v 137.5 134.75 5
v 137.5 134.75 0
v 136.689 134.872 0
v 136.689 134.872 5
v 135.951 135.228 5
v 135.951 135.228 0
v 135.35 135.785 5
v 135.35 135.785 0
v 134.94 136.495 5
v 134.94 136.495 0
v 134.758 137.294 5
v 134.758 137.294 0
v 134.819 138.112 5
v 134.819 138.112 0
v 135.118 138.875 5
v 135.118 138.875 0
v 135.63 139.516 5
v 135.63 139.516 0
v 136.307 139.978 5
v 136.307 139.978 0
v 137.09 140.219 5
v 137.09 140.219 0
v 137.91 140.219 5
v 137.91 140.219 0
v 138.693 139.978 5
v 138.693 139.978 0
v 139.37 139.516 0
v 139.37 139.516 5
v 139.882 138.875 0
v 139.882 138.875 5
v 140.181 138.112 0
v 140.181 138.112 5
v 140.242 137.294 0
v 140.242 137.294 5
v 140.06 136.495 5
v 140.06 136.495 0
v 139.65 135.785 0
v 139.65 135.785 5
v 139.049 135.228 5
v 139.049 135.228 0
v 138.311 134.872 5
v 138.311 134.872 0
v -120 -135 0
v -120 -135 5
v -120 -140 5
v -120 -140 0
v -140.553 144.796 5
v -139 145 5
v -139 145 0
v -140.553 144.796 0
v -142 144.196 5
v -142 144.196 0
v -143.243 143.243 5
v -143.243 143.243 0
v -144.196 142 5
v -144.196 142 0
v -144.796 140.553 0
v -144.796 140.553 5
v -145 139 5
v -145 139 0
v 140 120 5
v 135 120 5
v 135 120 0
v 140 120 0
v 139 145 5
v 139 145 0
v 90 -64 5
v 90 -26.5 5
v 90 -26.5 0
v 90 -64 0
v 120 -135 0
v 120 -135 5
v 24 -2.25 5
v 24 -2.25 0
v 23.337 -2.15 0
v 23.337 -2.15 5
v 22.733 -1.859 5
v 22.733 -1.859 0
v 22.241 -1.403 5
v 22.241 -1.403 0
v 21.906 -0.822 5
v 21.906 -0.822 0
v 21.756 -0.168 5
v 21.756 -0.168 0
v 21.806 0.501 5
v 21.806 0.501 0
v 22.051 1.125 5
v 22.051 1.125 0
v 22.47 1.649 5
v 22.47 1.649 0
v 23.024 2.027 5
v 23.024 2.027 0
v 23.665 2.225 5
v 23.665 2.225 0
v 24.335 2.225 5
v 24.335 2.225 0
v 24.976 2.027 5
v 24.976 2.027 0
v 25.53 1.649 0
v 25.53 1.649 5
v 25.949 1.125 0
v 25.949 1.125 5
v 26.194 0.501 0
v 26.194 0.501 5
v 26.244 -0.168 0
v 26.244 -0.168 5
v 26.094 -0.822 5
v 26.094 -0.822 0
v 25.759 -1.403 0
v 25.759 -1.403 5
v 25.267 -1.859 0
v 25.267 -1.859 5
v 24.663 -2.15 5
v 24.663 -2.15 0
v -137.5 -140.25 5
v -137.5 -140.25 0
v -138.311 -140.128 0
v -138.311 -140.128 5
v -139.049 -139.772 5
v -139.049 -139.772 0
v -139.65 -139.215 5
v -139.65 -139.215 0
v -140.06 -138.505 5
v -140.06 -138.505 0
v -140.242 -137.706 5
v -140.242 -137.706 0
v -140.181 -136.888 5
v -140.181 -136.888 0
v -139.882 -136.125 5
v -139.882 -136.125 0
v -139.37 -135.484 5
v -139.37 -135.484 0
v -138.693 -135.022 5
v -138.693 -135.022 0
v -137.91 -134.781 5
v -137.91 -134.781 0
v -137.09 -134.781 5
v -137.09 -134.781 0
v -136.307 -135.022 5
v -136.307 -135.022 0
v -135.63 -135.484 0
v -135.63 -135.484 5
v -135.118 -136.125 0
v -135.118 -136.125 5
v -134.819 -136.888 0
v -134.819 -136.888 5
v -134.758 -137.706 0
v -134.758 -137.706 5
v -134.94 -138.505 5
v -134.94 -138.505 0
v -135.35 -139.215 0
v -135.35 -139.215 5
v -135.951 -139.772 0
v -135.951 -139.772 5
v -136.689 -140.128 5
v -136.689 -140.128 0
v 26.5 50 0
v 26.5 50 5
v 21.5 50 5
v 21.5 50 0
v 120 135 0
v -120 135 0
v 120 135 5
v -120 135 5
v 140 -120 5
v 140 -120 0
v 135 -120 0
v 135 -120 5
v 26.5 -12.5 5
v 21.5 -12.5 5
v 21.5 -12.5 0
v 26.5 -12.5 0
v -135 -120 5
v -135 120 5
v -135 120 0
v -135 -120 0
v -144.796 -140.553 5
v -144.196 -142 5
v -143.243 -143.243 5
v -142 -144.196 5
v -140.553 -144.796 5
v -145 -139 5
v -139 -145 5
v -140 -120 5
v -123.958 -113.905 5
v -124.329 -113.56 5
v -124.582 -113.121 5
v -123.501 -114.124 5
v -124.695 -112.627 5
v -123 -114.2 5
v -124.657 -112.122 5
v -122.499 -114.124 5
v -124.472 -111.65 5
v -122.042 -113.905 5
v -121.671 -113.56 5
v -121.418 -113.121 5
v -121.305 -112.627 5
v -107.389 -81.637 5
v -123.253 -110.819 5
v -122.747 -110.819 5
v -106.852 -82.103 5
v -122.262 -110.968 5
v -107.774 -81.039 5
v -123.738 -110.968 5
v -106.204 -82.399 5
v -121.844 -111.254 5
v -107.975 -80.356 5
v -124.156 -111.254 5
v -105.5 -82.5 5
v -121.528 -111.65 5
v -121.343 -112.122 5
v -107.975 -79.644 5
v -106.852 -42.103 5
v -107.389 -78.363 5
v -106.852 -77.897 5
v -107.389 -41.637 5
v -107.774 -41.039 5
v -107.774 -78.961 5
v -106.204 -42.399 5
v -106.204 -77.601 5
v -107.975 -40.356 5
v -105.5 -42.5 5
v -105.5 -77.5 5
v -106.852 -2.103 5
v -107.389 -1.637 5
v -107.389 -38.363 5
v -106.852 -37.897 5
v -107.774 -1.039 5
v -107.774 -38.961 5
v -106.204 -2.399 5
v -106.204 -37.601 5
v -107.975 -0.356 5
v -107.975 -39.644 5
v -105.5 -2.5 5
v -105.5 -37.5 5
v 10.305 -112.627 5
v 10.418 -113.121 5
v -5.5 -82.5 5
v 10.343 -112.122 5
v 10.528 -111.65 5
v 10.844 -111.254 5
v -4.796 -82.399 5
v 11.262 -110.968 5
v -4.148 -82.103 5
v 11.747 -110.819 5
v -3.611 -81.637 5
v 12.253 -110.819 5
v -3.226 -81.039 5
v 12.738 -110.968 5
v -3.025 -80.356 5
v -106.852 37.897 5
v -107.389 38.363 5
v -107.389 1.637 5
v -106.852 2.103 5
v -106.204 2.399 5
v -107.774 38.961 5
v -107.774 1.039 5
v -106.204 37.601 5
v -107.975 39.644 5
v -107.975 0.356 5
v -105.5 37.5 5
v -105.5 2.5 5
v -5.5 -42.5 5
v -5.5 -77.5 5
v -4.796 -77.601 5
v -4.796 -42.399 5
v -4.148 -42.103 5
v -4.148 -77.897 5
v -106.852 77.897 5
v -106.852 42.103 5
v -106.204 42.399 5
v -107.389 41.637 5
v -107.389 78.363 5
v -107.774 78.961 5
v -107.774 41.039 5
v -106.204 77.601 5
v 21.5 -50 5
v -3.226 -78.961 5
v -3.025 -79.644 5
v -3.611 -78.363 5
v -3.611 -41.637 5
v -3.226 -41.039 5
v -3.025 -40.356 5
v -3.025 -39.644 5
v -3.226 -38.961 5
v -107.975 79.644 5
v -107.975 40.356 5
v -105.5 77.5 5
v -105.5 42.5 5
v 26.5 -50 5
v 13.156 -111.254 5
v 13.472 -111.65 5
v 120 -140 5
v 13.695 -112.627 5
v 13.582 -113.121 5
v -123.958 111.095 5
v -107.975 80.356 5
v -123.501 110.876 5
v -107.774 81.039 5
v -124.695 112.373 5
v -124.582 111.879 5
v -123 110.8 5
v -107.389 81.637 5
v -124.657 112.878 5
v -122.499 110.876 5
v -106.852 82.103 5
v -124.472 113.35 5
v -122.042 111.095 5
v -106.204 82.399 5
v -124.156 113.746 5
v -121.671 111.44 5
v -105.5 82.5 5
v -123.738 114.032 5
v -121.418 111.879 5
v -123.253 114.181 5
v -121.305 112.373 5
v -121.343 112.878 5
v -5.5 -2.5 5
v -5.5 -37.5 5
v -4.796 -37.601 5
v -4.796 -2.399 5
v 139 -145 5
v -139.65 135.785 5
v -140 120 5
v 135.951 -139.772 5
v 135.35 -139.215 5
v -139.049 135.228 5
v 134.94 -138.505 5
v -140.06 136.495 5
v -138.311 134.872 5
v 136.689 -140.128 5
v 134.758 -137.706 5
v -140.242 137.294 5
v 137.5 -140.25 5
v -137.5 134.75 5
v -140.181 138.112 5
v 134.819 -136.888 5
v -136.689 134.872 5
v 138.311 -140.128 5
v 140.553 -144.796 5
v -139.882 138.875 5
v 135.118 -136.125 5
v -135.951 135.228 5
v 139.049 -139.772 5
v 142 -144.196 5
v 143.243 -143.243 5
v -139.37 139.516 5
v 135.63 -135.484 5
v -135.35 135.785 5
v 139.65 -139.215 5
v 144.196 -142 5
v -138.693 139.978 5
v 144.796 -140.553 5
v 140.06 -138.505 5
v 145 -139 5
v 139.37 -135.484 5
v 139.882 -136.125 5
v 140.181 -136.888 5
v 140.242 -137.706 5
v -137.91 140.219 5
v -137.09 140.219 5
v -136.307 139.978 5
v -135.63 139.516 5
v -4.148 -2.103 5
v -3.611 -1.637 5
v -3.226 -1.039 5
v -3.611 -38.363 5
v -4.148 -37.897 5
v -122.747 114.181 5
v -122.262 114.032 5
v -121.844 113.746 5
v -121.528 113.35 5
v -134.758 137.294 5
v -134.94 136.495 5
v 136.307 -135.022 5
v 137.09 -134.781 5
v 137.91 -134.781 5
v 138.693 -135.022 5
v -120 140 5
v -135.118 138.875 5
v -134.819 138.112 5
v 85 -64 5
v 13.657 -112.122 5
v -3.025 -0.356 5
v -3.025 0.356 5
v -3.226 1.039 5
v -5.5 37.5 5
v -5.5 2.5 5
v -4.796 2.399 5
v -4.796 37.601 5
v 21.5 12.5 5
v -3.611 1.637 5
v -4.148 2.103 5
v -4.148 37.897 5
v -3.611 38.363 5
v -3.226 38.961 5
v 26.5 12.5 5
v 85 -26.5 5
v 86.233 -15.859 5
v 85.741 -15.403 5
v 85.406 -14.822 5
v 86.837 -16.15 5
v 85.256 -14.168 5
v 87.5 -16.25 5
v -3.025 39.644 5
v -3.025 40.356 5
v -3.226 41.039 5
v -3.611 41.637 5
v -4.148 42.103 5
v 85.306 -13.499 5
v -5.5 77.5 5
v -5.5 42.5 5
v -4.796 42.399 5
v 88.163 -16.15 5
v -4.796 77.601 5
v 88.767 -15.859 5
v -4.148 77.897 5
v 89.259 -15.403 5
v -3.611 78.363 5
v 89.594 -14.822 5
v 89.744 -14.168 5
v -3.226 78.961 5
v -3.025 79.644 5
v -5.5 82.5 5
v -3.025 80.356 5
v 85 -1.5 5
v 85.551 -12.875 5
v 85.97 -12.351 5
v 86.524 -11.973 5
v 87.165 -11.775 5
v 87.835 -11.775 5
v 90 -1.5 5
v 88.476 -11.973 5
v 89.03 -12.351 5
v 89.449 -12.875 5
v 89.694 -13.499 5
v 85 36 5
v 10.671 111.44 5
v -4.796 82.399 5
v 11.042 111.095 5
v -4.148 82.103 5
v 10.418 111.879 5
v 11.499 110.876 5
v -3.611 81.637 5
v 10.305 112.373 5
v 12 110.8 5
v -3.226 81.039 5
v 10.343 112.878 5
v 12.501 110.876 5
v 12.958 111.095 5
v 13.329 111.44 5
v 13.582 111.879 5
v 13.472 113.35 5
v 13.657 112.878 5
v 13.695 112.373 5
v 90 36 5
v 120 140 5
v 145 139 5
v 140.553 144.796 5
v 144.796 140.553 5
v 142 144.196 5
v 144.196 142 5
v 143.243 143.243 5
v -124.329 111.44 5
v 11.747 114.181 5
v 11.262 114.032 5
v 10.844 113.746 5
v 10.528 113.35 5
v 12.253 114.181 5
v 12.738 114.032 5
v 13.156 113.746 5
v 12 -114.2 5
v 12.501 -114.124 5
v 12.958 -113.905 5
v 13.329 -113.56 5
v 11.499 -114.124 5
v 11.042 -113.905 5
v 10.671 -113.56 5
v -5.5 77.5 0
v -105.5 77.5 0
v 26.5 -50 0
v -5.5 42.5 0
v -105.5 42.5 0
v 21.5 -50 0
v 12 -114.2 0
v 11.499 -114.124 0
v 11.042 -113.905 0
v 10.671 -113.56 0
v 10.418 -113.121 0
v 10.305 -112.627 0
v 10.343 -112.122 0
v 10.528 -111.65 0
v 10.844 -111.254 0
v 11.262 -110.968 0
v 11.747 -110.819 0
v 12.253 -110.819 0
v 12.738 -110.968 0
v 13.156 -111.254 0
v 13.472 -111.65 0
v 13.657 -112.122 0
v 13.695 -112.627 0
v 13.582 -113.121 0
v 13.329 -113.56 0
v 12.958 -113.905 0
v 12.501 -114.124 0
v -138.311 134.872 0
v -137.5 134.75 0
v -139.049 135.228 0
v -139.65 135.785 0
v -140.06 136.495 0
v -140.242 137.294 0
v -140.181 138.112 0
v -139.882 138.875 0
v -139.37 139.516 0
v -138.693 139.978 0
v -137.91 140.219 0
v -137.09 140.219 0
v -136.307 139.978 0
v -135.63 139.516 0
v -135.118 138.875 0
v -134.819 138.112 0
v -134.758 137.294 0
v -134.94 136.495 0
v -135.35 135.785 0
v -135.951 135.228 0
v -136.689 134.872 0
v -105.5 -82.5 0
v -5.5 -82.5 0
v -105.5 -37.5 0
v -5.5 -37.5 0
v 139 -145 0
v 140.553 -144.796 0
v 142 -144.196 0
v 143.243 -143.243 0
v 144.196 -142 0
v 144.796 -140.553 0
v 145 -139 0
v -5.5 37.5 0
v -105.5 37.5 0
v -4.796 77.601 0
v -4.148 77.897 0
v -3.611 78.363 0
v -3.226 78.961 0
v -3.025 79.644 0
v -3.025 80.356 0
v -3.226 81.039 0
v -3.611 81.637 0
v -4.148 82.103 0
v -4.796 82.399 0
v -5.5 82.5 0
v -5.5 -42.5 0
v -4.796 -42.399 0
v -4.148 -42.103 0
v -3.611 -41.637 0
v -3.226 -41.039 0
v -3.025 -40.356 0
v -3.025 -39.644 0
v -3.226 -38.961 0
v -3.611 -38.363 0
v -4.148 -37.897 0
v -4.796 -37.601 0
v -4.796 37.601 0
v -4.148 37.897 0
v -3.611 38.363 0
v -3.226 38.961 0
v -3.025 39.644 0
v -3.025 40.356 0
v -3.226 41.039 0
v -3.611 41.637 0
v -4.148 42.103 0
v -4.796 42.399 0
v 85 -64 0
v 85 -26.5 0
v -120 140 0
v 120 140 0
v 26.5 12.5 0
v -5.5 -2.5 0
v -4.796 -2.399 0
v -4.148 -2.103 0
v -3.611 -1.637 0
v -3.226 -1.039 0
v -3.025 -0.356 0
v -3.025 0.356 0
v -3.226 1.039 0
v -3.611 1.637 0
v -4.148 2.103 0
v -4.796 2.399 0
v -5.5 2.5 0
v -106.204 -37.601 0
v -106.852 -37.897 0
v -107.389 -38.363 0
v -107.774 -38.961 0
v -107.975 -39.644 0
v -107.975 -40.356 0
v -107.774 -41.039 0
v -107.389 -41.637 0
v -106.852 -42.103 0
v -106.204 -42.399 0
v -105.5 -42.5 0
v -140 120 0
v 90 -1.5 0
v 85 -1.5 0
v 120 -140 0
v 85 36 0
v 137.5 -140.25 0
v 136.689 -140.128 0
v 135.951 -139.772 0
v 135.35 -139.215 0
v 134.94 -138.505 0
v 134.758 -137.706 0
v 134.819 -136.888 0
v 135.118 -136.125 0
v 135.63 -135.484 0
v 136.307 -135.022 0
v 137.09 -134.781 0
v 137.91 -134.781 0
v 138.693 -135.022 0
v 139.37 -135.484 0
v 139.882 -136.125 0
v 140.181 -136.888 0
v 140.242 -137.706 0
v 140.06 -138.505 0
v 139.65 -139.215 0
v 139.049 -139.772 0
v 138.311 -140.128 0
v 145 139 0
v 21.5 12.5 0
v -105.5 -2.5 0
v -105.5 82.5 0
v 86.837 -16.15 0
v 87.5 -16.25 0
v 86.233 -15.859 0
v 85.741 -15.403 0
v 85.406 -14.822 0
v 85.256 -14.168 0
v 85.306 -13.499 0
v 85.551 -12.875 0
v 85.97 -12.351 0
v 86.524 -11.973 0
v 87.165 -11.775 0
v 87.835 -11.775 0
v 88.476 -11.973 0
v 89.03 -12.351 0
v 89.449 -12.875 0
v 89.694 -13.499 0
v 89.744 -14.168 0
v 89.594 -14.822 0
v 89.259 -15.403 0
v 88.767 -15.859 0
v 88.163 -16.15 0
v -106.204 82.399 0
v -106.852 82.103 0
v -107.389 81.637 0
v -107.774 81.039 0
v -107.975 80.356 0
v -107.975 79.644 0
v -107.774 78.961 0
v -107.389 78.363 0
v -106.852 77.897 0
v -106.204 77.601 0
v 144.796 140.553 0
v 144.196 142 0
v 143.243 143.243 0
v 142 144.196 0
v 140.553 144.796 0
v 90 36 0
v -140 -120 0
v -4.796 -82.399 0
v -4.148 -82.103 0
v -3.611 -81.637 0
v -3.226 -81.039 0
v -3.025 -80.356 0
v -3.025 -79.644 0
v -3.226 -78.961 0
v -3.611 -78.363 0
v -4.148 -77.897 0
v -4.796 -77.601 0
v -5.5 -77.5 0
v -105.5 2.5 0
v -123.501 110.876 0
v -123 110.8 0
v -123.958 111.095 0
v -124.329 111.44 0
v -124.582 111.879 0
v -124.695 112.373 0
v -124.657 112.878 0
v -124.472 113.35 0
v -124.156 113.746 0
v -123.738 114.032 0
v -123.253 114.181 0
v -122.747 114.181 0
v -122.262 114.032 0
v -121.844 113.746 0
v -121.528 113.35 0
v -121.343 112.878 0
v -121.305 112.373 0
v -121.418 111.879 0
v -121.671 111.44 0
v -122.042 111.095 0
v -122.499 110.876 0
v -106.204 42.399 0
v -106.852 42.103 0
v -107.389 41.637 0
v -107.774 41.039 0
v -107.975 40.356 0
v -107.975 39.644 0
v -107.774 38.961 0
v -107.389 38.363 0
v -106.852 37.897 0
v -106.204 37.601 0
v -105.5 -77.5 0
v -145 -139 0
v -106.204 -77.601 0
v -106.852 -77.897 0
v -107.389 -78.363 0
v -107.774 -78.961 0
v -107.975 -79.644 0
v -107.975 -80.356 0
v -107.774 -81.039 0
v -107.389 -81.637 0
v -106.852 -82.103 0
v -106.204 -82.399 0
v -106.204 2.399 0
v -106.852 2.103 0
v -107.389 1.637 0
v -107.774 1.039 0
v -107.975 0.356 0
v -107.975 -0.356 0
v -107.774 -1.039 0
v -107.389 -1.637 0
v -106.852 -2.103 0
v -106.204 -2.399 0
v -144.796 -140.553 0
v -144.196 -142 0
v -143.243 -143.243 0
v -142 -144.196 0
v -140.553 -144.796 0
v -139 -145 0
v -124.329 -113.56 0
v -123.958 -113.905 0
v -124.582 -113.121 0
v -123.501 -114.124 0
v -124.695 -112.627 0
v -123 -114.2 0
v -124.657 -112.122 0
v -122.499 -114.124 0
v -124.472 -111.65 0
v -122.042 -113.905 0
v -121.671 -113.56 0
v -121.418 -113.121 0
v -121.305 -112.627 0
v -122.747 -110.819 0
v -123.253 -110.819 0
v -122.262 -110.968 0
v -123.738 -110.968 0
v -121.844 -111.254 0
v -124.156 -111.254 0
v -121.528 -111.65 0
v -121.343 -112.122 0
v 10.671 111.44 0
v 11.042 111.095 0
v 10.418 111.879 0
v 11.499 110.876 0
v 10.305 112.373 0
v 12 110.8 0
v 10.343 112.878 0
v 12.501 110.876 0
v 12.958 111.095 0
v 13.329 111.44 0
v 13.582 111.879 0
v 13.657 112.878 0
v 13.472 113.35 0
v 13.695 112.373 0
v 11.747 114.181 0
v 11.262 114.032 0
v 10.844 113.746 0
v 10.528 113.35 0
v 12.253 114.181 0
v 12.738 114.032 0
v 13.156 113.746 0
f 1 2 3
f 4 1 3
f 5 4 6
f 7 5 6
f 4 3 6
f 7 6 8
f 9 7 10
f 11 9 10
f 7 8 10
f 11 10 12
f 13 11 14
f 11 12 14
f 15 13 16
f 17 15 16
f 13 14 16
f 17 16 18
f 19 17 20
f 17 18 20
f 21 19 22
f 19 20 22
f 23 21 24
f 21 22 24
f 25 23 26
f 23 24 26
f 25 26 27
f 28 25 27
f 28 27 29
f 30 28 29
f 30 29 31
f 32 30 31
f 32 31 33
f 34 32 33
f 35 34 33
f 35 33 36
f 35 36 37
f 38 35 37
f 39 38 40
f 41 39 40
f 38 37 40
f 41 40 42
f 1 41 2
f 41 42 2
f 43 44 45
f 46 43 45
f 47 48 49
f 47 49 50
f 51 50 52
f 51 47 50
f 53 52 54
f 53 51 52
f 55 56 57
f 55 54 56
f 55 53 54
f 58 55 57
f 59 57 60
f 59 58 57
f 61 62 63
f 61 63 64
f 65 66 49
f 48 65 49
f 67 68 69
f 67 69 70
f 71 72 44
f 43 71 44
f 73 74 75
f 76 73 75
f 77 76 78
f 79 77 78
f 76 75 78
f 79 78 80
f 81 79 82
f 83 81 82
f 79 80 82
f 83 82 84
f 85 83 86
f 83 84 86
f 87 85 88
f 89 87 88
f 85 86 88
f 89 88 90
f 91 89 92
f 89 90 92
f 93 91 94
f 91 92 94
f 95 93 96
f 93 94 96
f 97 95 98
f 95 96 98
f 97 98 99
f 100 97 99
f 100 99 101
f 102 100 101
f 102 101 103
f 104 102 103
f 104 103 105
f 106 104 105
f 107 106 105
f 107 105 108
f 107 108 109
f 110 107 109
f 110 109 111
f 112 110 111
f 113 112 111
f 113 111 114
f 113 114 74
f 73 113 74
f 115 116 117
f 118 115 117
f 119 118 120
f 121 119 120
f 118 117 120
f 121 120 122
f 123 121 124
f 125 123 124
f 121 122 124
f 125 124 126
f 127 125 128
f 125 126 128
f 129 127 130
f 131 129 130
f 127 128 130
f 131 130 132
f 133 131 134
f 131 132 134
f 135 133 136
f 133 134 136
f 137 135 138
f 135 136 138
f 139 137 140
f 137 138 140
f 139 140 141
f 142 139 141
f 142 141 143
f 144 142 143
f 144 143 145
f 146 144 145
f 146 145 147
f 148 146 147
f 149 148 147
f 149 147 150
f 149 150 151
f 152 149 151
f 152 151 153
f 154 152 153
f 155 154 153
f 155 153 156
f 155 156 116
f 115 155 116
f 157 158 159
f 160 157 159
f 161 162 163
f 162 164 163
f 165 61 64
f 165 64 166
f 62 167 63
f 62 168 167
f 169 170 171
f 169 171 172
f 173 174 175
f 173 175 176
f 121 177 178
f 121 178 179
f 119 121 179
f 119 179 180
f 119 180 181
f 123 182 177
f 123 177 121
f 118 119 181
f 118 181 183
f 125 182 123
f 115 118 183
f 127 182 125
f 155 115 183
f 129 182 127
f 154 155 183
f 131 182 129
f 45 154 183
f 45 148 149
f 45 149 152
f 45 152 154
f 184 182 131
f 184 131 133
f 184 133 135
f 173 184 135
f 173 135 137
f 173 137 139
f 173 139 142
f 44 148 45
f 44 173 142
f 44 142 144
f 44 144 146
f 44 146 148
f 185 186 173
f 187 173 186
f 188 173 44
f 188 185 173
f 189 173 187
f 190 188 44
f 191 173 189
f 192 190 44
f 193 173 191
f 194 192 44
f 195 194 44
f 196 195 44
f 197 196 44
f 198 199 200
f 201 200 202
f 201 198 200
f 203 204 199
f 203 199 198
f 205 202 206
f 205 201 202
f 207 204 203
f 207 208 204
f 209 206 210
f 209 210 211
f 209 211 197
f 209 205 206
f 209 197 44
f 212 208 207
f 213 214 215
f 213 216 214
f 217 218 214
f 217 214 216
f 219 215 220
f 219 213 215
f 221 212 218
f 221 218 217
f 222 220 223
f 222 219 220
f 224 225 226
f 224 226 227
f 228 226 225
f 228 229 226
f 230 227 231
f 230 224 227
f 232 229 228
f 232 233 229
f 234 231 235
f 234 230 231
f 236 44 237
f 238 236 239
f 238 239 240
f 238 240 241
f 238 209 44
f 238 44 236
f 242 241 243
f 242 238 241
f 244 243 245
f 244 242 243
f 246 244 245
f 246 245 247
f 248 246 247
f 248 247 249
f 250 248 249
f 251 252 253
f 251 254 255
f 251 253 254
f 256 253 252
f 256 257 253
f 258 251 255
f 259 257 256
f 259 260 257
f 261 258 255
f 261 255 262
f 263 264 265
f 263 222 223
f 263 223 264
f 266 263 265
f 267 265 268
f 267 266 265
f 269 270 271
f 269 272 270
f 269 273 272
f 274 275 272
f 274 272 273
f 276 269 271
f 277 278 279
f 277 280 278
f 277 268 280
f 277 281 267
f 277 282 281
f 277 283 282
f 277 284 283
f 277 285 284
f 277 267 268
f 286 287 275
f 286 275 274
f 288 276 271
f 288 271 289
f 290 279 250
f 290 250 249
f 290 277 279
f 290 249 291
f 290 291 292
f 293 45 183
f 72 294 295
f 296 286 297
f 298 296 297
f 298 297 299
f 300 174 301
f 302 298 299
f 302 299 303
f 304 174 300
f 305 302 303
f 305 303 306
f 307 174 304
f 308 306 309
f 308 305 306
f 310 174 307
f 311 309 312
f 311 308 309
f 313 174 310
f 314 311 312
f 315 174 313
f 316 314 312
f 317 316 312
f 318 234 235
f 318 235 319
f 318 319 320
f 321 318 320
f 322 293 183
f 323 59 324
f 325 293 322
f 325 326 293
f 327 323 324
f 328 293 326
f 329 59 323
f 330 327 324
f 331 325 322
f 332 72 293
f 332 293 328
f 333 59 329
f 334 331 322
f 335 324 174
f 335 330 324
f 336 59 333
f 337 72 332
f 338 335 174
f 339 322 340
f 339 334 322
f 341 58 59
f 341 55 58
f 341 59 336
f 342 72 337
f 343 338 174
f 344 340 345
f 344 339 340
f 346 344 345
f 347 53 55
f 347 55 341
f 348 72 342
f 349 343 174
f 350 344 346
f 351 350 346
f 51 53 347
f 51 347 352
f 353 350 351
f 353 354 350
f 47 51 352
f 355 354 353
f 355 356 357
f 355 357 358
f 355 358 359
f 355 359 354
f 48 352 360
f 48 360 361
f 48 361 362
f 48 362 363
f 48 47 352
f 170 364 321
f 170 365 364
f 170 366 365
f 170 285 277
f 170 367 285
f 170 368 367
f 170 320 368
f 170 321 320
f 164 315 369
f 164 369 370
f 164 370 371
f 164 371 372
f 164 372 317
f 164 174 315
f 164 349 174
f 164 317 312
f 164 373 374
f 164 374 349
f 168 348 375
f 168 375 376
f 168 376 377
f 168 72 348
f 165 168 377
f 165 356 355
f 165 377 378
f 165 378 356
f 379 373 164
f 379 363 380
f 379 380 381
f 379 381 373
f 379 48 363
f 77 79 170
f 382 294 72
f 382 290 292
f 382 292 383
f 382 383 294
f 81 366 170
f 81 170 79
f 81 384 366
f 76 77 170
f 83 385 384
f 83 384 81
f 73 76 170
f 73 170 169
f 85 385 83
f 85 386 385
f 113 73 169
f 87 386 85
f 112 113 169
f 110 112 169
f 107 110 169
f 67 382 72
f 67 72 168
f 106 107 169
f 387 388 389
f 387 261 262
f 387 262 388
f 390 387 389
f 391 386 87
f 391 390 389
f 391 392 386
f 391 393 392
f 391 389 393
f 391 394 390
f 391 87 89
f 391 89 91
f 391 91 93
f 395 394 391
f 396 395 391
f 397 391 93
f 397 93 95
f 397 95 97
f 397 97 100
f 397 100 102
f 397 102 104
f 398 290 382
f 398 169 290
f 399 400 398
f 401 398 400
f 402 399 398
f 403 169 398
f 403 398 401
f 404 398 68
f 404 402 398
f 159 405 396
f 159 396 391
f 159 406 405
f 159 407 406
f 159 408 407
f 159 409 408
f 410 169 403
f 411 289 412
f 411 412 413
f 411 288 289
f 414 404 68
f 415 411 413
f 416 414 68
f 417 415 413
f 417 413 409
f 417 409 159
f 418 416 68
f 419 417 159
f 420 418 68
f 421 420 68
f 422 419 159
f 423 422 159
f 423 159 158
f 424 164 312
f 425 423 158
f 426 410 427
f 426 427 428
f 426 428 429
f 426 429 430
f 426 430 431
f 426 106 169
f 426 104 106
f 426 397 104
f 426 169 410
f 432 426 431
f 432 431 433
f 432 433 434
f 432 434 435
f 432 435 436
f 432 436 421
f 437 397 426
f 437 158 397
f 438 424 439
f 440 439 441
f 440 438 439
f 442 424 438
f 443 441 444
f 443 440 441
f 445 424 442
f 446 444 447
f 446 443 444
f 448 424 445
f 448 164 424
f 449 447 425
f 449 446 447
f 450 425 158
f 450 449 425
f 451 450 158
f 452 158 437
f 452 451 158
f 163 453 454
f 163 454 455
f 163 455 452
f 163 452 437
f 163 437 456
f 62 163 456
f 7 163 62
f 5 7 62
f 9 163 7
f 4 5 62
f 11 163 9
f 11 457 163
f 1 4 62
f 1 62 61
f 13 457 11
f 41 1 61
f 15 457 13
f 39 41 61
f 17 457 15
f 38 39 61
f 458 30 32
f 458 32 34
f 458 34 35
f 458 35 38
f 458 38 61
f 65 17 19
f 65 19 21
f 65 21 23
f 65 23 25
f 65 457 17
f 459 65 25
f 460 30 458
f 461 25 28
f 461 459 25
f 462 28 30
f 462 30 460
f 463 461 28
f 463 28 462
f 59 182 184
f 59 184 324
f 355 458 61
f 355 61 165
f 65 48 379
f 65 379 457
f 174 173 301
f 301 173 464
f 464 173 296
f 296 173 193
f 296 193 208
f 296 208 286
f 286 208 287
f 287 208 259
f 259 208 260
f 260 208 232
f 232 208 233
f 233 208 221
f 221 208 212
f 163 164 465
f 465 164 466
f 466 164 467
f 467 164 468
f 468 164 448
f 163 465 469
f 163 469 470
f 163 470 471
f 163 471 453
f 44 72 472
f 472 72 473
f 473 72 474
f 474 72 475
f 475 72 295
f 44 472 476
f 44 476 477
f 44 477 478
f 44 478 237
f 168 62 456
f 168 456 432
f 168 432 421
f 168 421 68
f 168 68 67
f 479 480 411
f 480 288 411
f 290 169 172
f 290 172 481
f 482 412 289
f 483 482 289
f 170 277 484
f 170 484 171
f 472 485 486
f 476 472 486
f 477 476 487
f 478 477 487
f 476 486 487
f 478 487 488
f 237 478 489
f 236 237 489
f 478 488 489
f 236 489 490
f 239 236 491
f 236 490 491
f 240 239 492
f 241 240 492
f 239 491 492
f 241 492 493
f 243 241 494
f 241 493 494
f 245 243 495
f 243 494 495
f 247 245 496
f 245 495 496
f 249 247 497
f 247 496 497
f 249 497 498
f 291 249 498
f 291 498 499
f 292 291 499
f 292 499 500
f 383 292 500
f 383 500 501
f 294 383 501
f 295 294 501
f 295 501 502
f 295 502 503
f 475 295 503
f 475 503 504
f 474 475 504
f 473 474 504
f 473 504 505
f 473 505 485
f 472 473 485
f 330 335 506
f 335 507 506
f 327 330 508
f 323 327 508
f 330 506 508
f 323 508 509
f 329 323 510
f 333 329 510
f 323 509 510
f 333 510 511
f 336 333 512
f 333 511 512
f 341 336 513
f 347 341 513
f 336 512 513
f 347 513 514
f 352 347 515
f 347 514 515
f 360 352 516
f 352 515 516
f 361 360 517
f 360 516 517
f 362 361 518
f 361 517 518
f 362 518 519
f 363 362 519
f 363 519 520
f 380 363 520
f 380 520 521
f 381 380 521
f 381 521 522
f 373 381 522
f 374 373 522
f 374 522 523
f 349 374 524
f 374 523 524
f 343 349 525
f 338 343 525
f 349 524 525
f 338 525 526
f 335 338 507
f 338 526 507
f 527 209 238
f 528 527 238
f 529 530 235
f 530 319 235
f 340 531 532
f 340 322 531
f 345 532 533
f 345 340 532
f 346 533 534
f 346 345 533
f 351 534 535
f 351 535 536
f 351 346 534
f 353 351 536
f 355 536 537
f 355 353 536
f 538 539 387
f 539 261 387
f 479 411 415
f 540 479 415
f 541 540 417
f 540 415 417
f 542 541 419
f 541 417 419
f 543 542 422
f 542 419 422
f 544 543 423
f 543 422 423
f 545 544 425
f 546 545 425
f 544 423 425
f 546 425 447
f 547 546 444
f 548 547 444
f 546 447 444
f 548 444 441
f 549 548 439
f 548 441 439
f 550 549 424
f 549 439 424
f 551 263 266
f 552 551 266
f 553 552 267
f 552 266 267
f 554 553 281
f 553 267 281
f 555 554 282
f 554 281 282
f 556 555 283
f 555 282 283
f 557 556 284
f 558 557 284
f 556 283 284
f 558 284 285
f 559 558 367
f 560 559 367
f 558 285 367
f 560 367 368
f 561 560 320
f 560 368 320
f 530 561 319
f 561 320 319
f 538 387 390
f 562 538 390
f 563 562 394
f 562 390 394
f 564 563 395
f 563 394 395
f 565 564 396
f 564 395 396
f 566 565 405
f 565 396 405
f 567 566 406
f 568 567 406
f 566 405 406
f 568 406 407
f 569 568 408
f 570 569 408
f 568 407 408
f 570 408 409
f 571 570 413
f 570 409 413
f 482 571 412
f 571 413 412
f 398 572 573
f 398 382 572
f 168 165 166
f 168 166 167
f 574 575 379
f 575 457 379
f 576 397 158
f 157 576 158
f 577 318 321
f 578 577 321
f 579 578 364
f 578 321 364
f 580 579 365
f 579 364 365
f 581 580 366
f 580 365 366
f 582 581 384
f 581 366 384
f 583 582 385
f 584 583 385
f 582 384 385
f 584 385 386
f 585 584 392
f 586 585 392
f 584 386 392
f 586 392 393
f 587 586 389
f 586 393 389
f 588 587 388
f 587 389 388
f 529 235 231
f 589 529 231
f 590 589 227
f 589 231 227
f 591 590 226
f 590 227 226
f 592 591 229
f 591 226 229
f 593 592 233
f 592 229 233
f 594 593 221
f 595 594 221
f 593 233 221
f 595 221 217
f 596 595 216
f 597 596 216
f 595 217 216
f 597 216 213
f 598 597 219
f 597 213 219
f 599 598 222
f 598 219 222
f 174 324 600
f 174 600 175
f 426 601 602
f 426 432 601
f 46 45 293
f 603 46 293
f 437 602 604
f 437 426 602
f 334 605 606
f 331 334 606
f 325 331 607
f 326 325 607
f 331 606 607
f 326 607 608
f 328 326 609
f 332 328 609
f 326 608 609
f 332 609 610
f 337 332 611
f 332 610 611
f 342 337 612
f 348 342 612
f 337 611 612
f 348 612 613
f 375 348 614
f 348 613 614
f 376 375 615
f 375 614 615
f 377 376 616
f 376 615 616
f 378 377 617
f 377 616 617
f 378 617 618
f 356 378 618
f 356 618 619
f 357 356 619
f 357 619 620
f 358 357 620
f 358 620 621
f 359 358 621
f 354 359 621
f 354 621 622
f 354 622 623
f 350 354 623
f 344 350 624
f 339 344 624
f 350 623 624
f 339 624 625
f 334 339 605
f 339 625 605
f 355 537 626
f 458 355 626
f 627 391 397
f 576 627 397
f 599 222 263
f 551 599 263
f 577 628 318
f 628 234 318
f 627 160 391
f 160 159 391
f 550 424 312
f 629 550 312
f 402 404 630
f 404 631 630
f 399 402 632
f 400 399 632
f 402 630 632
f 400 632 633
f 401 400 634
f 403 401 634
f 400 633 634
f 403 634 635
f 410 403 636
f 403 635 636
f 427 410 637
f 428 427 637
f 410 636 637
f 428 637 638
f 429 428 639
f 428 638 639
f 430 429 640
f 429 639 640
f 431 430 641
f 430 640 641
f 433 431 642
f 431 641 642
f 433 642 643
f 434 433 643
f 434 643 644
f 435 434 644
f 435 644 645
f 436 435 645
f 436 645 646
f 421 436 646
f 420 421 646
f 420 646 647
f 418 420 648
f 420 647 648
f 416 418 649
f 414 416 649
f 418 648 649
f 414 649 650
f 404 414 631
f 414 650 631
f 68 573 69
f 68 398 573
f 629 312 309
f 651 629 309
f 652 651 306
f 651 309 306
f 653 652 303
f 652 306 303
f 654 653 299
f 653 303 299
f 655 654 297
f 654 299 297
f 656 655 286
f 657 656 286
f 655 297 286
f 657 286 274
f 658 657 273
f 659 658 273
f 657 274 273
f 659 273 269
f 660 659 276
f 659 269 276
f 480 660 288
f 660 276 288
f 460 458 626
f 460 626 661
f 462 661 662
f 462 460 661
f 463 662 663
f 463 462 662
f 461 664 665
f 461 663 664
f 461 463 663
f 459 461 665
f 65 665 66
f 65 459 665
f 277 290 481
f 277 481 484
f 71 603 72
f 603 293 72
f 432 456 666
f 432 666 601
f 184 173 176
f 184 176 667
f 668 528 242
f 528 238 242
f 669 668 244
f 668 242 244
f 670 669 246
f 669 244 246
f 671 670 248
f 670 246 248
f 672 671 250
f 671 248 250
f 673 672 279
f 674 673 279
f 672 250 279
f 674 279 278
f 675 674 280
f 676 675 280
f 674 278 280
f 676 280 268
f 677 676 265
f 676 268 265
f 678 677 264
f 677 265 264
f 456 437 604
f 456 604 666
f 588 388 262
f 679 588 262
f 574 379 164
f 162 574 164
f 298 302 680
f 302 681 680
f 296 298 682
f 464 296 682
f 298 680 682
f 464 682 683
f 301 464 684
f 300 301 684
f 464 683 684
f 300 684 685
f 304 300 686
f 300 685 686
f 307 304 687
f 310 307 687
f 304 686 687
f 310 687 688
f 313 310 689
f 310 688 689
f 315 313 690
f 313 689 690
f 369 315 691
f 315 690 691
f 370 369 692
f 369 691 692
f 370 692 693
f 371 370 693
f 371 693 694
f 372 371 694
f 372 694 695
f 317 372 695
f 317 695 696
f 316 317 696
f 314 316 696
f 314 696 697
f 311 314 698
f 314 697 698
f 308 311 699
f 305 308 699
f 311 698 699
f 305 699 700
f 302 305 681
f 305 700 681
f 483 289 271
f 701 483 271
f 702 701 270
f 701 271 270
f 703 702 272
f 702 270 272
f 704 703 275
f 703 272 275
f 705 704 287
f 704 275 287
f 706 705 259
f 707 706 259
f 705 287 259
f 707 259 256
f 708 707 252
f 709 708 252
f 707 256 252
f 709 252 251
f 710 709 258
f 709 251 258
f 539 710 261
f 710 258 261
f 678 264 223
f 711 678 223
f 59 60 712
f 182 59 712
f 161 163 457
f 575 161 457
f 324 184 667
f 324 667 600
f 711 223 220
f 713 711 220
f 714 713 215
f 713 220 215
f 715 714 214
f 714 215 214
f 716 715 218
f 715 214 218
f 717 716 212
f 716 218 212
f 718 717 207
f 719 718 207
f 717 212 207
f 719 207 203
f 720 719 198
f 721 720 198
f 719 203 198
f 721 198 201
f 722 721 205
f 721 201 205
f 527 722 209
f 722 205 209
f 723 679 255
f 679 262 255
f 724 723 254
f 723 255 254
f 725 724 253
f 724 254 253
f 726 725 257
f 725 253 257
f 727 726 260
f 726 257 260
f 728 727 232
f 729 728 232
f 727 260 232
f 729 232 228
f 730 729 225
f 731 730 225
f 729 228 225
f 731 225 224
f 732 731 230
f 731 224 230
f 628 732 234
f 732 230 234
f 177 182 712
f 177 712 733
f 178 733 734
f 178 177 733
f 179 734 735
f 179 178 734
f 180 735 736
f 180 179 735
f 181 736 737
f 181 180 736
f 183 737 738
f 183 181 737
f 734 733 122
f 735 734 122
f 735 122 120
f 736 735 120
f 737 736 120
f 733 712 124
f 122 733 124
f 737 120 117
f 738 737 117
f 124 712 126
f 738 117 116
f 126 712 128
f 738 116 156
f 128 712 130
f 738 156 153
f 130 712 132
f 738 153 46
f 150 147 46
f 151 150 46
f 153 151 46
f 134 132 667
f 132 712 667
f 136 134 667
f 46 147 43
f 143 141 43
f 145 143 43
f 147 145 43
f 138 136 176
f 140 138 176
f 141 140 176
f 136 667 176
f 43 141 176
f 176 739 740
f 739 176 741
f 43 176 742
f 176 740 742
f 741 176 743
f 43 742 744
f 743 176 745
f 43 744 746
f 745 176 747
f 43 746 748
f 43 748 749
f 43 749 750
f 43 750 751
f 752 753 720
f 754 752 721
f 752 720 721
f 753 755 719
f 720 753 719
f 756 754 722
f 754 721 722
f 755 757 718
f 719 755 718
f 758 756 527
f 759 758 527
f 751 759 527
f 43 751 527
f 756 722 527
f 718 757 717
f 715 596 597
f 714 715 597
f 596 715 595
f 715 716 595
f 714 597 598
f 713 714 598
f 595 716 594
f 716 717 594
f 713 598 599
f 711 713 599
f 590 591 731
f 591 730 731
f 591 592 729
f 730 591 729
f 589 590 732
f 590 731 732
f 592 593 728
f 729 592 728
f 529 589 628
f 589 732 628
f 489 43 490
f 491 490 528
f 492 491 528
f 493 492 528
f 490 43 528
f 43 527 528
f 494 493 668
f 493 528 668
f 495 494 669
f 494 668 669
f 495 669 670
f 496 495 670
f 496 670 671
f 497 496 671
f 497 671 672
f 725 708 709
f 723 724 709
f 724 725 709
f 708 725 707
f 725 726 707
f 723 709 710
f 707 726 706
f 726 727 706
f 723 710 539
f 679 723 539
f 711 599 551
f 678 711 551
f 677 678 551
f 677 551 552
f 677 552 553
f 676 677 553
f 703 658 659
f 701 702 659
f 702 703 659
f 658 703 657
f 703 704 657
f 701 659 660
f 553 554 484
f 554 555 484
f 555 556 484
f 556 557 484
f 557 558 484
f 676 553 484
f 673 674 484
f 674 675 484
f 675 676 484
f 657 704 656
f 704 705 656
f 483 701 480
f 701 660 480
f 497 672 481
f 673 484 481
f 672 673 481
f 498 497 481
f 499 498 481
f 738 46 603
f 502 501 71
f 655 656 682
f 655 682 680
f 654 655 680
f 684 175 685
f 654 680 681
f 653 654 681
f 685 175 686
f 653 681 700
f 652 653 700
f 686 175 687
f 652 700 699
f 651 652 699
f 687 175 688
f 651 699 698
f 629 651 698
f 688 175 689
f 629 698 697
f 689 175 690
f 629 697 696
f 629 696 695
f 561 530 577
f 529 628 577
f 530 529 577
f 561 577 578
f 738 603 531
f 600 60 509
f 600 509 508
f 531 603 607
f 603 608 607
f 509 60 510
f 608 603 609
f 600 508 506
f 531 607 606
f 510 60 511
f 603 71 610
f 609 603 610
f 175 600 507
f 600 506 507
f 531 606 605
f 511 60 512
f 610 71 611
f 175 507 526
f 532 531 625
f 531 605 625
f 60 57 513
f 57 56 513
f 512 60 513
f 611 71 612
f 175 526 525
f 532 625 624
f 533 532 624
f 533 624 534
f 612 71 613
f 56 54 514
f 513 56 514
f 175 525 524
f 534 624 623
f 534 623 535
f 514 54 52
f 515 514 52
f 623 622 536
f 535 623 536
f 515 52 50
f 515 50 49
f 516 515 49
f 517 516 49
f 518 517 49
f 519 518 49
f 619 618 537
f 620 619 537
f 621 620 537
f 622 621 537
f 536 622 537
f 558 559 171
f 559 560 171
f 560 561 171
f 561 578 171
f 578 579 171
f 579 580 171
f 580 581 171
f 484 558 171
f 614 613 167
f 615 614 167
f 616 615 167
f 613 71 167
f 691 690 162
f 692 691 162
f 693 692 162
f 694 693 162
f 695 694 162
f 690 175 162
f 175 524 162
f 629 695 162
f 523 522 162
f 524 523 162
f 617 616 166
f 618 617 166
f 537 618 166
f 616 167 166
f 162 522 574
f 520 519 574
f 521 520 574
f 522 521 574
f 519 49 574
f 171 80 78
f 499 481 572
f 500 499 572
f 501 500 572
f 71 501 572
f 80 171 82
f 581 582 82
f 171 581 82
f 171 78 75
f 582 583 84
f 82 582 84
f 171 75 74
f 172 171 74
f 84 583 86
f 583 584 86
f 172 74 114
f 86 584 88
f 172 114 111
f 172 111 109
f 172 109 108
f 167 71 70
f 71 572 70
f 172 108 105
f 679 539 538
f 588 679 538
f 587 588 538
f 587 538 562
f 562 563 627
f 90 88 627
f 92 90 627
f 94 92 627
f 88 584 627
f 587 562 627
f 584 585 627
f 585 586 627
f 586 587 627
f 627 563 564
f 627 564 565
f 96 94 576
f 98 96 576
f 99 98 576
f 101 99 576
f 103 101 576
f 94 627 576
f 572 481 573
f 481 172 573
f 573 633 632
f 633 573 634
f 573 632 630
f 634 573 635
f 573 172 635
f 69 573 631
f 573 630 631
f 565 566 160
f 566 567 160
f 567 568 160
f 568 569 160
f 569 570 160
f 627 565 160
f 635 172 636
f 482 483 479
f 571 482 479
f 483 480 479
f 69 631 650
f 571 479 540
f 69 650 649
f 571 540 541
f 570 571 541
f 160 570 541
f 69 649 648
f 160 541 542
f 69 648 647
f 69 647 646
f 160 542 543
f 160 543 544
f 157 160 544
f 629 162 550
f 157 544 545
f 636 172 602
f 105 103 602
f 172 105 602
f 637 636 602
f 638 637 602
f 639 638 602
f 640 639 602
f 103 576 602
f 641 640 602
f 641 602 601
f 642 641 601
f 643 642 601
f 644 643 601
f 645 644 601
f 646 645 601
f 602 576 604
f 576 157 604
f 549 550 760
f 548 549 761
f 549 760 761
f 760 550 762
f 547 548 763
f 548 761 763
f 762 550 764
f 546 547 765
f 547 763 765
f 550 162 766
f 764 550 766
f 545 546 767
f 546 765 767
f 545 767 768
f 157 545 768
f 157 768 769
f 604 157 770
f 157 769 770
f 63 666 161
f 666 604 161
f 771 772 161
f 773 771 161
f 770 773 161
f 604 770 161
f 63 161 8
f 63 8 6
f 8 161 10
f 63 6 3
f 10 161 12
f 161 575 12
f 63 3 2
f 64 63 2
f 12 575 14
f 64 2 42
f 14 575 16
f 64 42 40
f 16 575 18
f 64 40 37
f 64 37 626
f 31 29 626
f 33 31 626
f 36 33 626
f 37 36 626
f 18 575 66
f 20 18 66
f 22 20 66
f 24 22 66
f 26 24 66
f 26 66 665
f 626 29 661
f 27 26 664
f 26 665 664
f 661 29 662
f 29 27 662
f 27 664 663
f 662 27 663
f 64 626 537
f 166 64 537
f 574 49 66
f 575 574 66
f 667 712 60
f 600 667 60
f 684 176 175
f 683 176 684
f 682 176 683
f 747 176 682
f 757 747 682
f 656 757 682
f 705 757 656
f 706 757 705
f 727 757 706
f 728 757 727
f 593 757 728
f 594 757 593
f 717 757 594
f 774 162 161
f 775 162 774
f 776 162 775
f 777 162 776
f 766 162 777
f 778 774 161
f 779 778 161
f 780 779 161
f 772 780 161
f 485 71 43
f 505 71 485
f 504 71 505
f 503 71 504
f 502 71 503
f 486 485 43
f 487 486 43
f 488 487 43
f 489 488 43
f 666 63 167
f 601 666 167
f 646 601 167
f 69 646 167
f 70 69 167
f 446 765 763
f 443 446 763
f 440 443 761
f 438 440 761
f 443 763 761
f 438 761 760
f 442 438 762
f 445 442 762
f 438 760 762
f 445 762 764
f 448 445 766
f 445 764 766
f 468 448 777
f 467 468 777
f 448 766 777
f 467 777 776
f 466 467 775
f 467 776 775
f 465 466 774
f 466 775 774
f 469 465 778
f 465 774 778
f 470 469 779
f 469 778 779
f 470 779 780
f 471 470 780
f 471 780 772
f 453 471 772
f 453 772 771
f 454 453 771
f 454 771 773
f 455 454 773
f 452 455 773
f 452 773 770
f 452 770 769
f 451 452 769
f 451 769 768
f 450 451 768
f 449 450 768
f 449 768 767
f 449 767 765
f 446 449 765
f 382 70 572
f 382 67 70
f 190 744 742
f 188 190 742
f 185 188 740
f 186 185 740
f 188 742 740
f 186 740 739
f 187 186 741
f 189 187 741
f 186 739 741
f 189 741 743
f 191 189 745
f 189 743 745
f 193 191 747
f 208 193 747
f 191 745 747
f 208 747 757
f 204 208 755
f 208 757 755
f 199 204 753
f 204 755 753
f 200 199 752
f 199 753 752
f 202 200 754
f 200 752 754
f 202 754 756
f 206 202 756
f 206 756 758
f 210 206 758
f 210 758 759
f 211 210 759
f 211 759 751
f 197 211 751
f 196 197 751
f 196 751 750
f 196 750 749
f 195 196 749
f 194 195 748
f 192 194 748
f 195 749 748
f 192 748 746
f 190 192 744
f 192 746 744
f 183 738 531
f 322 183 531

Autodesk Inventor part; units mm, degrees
ref_plane "YZ Plane" through (0, 0, 0) normal (1, 0, 0) x (0, 1, 0)
ref_plane "XZ Plane" through (0, 0, 0) normal (0, 1, 0) x (-1, 0, 0)
ref_plane "XY Plane" through (0, 0, 0) normal (0, 0, 1) x (1, 0, 0)
sketch "Sketch1" plane through (0, 0, 0) normal (0, 0, 1) x (1, 0, 0)
  line L0 (-145, -145) -> (145, -145)
  line L1 (145, -145) -> (145, 145)
  line L2 (145, 145) -> (-145, 145)
  line L3 (-145, 145) -> (-145, -145)
  line L4 (-145, -145) -> (145, 145) construction
  line L5 (145, -145) -> (-145, 145) construction
  point P0 (0, 0)
  dimension "d0" = 290
  dimension "d1" = 290
extrude "Extrusion1" add sketch "Sketch1" along normal blind 5
sketch "Sketch2" plane through (0, 0, 5) normal (0, 0, 1) x (1, 0, 0)
  line L0 (-137.5, -137.5) -> (137.5, -137.5) construction
  line L1 (137.5, -137.5) -> (137.5, 137.5) construction
  line L2 (137.5, 137.5) -> (-137.5, 137.5) construction
  line L3 (-137.5, 137.5) -> (-137.5, -137.5) construction
  line L4 (-137.5, -137.5) -> (137.5, 137.5) construction
  line L5 (137.5, -137.5) -> (-137.5, 137.5) construction
  point P0 (0, 0)
  dimension "d4" = 275
  dimension "d5" = 275
hole "Hole1" at (-137.5, 137.5, 5) at (137.5, 137.5, 5) at (137.5, -137.5, 5) at (-137.5, -137.5, 5) direction (0, 0, -1) diameter 5.5 depth 8 tip angle 118 clearance for "Countersunk Flat Head Screw DIN EN ISO 2009" size "M5" standard "DIN"
sketch "Sketch3" plane through (0, 0, 5) normal (0, 0, 1) x (1, 0, 0)
  line L0 (-123, 112.5) -> (12, 112.5) construction
  line L1 (12, 112.5) -> (12, -112.5) construction
  line L2 (12, -112.5) -> (-123, -112.5) construction
  line L3 (-123, -112.5) -> (-123, 112.5) construction
  line L4 (-145, 145) -> (-145, -145) projected
  line L5 (145, -145) -> (145, 145) projected
  point P0 (0, 0)
  point P1 (12, 0)
  dimension "d13" = 135
  dimension "d34" = 225
  dimension "d35" = 22
hole "Hole2" at (-123, 112.5, 5) at (12, 112.5, 5) at (12, -112.5, 5) at (-123, -112.5, 5) direction (0, 0, -1) diameter 3.4 depth 8 tip angle 118 clearance for "Countersunk Flat Head Screw DIN EN ISO 2009" size "M3" standard "DIN"
sketch "Sketch4" plane through (0, 0, 5) normal (0, 0, 1) x (1, 0, 0)
  line L0 (-140, 120) -> (-135, 120)
  line L1 (-135, 120) -> (-135, -120)
  line L2 (-135, -120) -> (-140, -120)
  line L3 (-140, -120) -> (-140, 120)
  line L4 (-120, -140) -> (120, -140)
  line L5 (120, -140) -> (120, -135)
  line L6 (120, -135) -> (-120, -135)
  line L7 (-120, -135) -> (-120, -140)
  line L8 (140, -120) -> (135, -120)
  line L9 (135, -120) -> (135, 120)
  line L10 (135, 120) -> (140, 120)
  line L11 (140, 120) -> (140, -120)
  line L12 (120, 140) -> (-120, 140)
  line L13 (-120, 140) -> (-120, 135)
  line L14 (-120, 135) -> (120, 135)
  line L15 (120, 135) -> (120, 140)
  line L16 (-145, 145) -> (-145, -145) projected
  line L17 (145, 145) -> (-145, 145) projected
  line L18 (145, -145) -> (145, 145) projected
  line L19 (-145, -145) -> (145, -145) projected
  point P0 (0, 0)
  point P1 (0, 135)
  point P2 (0, -135)
  point P3 (-135, 0)
  point P4 (135, 0)
  dimension "d21" = 240
  dimension "d22" = 240
  dimension "d23" = 5
  dimension "d24" = 5
  dimension "d25" = 5
  dimension "d26" = 5
  dimension "d27" = 5
  dimension "d28" = 5
  dimension "d29" = 5
  dimension "d30" = 5
extrude "Extrusion2" cut sketch "Sketch4" against normal blind 10 contours L0 L1 L2 L3 | L7 L6 L5 L4 | L8 L9 L10 L11 | L15 L14 L13 L12
fillet "Fillet1" radius 6 4 edges at (-145, -145, 2.5) (145, -145, 2.5) (145, 145, 2.5) (-145, 145, 2.5)
sketch "Sketch6" plane through (0, 0, 5) normal (0, 0, 1) x (1, 0, 0)
  line L0 (135, -120) -> (135, 120) construction
  line L1 (21.5, 12.5) -> (26.5, 12.5)
  line L2 (26.5, 12.5) -> (26.5, 50)
  line L3 (26.5, 50) -> (21.5, 50)
  line L4 (21.5, 50) -> (21.5, 12.5)
  line L5 (21.5, -12.5) -> (26.5, -12.5)
  line L6 (26.5, -12.5) -> (26.5, -50)
  line L7 (26.5, -50) -> (21.5, -50)
  line L8 (21.5, -50) -> (21.5, -12.5)
  line L9 (90, -64) -> (85, -64)
  line L10 (85, -64) -> (85, -26.5)
  line L11 (85, -26.5) -> (90, -26.5)
  line L12 (90, -26.5) -> (90, -64)
  line L13 (90, -1.5) -> (85, -1.5)
  line L14 (85, -1.5) -> (85, 36)
  line L15 (85, 36) -> (90, 36)
  line L16 (90, 36) -> (90, -1.5)
  line L17 (21.5, -12.5) -> (21.5, 12.5) construction
  point P0 (0, 0)
  point P1 (21.5, 0)
  dimension "d95" = 5
  dimension "d96" = 37.5
  dimension "d97" = 37.5
  dimension "d98" = 5
  dimension "d99" = 25
  dimension "d100" = 21.5
  dimension "d101" = 37.5
  dimension "d102" = 5
  dimension "d103" = 37.5
  dimension "d104" = 25
  dimension "d105" = 58.5
  dimension "d113" = 14
extrude "Extrusion3" cut sketch "Sketch6" against normal through all
sketch "Sketch7" plane through (0, 0, 5) normal (0, 0, 1) x (1, 0, 0)
  line L0 (21.5, 12.5) -> (21.5, 50) projected
  line L1 (26.5, 12.5) -> (21.5, 12.5) projected
  line L2 (85, -1.5) -> (85, 36) projected
  line L3 (90, -1.5) -> (85, -1.5) projected
  line L4 (85, -26.5) -> (90, -26.5) projected
  line L5 (21.5, -12.5) -> (26.5, -12.5) projected
  point P0 (0, 0)
  point P1 (24, 0)
  point P2 (87.5, -14)
  dimension "d107" = 2.5
  dimension "d108" = 2.5
  dimension "d109" = 25
  dimension "d110" = 12.5
  dimension "d111" = 25
  dimension "d112" = 12.5
hole "Hole3" at (24, 0, 5) at (87.5, -14, 5) direction (0, 0, -1) diameter 4.5 depth 8 tip angle 118 clearance for "Countersunk Flat Head Screw DIN EN ISO 2009" size "M4" standard "DIN"
sketch "Sketch11" plane through (0, 0, 5) normal (0, 0, 1) x (1, 0, 0)
  circle A0 centre (12, 112.5) radius 1.7 projected
  circle A1 centre (-123, 112.5) radius 1.7 projected
  circle A2 centre (-123, -112.5) radius 1.7 projected
  circle A3 centre (12, -112.5) radius 1.7 projected
  line L0 (12, 112.5) -> (-123, 112.5) construction
  line L1 (-123, 112.5) -> (-123, -112.5) construction
  line L2 (-123, -112.5) -> (12, -112.5) construction
  line L3 (12, -112.5) -> (12, 112.5) construction
  line L4 (-5.5, 0) -> (-105.5, 0) construction
  line L5 (-5.5, 2.5) -> (-105.5, 2.5)
  line L6 (-105.5, -2.5) -> (-5.5, -2.5)
  arc A4 (-5.5, -2.5) -> (-5.5, 2.5) centre (-5.5, 0) ccw
  arc A5 (-105.5, 2.5) -> (-105.5, -2.5) centre (-105.5, 0) ccw
  line L7 (-5.5, 40) -> (-105.5, 40) construction
  line L8 (-5.5, 42.5) -> (-105.5, 42.5)
  line L9 (-105.5, 37.5) -> (-5.5, 37.5)
  arc A6 (-5.5, 37.5) -> (-5.5, 42.5) centre (-5.5, 40) ccw
  arc A7 (-105.5, 42.5) -> (-105.5, 37.5) centre (-105.5, 40) ccw
  line L10 (-5.5, 80) -> (-105.5, 80) construction
  line L11 (-5.5, 82.5) -> (-105.5, 82.5)
  line L12 (-105.5, 77.5) -> (-5.5, 77.5)
  arc A8 (-5.5, 77.5) -> (-5.5, 82.5) centre (-5.5, 80) ccw
  arc A9 (-105.5, 82.5) -> (-105.5, 77.5) centre (-105.5, 80) ccw
  line L13 (-5.5, -37.5) -> (-105.5, -37.5)
  line L14 (-5.5, -40) -> (-105.5, -40) construction
  line L15 (-105.5, -42.5) -> (-5.5, -42.5)
  arc A10 (-5.5, -42.5) -> (-5.5, -37.5) centre (-5.5, -40) ccw
  arc A11 (-105.5, -37.5) -> (-105.5, -42.5) centre (-105.5, -40) ccw
  line L16 (-5.5, -77.5) -> (-105.5, -77.5)
  line L17 (-5.5, -80) -> (-105.5, -80) construction
  line L18 (-105.5, -82.5) -> (-5.5, -82.5)
  arc A12 (-5.5, -82.5) -> (-5.5, -77.5) centre (-5.5, -80) ccw
  arc A13 (-105.5, -77.5) -> (-105.5, -82.5) centre (-105.5, -80) ccw
  point P0 (0, 0)
  point P1 (-55.5, 0)
  point P2 (-55.5, 40)
  point P3 (-55.5, 80)
  point P4 (-55.5, -40)
  point P5 (-55.5, -80)
  dimension "d114" = 5
  dimension "d115" = 100
  dimension "d116" = 135
  dimension "d117" = 17.5
  dimension "d120" = 40
  dimension "d127" = 40
extrude "Extrusion4" cut sketch "Sketch11" against normal blind 10 contours A4 L6 A5 L5 | A6 L9 A7 L8 | A8 L12 A9 L11 | A10 L15 A11 L13 | A12 L18 A13 L16
equation "\"d110\" = 0.5 * d109"
equation "\"d112\" = 0.5 * d111"
equation "\"d117\" = -0.5 * d115 + 0.5 * d116"
properties part number "bottom" material "Polycarbonate, Clear"
